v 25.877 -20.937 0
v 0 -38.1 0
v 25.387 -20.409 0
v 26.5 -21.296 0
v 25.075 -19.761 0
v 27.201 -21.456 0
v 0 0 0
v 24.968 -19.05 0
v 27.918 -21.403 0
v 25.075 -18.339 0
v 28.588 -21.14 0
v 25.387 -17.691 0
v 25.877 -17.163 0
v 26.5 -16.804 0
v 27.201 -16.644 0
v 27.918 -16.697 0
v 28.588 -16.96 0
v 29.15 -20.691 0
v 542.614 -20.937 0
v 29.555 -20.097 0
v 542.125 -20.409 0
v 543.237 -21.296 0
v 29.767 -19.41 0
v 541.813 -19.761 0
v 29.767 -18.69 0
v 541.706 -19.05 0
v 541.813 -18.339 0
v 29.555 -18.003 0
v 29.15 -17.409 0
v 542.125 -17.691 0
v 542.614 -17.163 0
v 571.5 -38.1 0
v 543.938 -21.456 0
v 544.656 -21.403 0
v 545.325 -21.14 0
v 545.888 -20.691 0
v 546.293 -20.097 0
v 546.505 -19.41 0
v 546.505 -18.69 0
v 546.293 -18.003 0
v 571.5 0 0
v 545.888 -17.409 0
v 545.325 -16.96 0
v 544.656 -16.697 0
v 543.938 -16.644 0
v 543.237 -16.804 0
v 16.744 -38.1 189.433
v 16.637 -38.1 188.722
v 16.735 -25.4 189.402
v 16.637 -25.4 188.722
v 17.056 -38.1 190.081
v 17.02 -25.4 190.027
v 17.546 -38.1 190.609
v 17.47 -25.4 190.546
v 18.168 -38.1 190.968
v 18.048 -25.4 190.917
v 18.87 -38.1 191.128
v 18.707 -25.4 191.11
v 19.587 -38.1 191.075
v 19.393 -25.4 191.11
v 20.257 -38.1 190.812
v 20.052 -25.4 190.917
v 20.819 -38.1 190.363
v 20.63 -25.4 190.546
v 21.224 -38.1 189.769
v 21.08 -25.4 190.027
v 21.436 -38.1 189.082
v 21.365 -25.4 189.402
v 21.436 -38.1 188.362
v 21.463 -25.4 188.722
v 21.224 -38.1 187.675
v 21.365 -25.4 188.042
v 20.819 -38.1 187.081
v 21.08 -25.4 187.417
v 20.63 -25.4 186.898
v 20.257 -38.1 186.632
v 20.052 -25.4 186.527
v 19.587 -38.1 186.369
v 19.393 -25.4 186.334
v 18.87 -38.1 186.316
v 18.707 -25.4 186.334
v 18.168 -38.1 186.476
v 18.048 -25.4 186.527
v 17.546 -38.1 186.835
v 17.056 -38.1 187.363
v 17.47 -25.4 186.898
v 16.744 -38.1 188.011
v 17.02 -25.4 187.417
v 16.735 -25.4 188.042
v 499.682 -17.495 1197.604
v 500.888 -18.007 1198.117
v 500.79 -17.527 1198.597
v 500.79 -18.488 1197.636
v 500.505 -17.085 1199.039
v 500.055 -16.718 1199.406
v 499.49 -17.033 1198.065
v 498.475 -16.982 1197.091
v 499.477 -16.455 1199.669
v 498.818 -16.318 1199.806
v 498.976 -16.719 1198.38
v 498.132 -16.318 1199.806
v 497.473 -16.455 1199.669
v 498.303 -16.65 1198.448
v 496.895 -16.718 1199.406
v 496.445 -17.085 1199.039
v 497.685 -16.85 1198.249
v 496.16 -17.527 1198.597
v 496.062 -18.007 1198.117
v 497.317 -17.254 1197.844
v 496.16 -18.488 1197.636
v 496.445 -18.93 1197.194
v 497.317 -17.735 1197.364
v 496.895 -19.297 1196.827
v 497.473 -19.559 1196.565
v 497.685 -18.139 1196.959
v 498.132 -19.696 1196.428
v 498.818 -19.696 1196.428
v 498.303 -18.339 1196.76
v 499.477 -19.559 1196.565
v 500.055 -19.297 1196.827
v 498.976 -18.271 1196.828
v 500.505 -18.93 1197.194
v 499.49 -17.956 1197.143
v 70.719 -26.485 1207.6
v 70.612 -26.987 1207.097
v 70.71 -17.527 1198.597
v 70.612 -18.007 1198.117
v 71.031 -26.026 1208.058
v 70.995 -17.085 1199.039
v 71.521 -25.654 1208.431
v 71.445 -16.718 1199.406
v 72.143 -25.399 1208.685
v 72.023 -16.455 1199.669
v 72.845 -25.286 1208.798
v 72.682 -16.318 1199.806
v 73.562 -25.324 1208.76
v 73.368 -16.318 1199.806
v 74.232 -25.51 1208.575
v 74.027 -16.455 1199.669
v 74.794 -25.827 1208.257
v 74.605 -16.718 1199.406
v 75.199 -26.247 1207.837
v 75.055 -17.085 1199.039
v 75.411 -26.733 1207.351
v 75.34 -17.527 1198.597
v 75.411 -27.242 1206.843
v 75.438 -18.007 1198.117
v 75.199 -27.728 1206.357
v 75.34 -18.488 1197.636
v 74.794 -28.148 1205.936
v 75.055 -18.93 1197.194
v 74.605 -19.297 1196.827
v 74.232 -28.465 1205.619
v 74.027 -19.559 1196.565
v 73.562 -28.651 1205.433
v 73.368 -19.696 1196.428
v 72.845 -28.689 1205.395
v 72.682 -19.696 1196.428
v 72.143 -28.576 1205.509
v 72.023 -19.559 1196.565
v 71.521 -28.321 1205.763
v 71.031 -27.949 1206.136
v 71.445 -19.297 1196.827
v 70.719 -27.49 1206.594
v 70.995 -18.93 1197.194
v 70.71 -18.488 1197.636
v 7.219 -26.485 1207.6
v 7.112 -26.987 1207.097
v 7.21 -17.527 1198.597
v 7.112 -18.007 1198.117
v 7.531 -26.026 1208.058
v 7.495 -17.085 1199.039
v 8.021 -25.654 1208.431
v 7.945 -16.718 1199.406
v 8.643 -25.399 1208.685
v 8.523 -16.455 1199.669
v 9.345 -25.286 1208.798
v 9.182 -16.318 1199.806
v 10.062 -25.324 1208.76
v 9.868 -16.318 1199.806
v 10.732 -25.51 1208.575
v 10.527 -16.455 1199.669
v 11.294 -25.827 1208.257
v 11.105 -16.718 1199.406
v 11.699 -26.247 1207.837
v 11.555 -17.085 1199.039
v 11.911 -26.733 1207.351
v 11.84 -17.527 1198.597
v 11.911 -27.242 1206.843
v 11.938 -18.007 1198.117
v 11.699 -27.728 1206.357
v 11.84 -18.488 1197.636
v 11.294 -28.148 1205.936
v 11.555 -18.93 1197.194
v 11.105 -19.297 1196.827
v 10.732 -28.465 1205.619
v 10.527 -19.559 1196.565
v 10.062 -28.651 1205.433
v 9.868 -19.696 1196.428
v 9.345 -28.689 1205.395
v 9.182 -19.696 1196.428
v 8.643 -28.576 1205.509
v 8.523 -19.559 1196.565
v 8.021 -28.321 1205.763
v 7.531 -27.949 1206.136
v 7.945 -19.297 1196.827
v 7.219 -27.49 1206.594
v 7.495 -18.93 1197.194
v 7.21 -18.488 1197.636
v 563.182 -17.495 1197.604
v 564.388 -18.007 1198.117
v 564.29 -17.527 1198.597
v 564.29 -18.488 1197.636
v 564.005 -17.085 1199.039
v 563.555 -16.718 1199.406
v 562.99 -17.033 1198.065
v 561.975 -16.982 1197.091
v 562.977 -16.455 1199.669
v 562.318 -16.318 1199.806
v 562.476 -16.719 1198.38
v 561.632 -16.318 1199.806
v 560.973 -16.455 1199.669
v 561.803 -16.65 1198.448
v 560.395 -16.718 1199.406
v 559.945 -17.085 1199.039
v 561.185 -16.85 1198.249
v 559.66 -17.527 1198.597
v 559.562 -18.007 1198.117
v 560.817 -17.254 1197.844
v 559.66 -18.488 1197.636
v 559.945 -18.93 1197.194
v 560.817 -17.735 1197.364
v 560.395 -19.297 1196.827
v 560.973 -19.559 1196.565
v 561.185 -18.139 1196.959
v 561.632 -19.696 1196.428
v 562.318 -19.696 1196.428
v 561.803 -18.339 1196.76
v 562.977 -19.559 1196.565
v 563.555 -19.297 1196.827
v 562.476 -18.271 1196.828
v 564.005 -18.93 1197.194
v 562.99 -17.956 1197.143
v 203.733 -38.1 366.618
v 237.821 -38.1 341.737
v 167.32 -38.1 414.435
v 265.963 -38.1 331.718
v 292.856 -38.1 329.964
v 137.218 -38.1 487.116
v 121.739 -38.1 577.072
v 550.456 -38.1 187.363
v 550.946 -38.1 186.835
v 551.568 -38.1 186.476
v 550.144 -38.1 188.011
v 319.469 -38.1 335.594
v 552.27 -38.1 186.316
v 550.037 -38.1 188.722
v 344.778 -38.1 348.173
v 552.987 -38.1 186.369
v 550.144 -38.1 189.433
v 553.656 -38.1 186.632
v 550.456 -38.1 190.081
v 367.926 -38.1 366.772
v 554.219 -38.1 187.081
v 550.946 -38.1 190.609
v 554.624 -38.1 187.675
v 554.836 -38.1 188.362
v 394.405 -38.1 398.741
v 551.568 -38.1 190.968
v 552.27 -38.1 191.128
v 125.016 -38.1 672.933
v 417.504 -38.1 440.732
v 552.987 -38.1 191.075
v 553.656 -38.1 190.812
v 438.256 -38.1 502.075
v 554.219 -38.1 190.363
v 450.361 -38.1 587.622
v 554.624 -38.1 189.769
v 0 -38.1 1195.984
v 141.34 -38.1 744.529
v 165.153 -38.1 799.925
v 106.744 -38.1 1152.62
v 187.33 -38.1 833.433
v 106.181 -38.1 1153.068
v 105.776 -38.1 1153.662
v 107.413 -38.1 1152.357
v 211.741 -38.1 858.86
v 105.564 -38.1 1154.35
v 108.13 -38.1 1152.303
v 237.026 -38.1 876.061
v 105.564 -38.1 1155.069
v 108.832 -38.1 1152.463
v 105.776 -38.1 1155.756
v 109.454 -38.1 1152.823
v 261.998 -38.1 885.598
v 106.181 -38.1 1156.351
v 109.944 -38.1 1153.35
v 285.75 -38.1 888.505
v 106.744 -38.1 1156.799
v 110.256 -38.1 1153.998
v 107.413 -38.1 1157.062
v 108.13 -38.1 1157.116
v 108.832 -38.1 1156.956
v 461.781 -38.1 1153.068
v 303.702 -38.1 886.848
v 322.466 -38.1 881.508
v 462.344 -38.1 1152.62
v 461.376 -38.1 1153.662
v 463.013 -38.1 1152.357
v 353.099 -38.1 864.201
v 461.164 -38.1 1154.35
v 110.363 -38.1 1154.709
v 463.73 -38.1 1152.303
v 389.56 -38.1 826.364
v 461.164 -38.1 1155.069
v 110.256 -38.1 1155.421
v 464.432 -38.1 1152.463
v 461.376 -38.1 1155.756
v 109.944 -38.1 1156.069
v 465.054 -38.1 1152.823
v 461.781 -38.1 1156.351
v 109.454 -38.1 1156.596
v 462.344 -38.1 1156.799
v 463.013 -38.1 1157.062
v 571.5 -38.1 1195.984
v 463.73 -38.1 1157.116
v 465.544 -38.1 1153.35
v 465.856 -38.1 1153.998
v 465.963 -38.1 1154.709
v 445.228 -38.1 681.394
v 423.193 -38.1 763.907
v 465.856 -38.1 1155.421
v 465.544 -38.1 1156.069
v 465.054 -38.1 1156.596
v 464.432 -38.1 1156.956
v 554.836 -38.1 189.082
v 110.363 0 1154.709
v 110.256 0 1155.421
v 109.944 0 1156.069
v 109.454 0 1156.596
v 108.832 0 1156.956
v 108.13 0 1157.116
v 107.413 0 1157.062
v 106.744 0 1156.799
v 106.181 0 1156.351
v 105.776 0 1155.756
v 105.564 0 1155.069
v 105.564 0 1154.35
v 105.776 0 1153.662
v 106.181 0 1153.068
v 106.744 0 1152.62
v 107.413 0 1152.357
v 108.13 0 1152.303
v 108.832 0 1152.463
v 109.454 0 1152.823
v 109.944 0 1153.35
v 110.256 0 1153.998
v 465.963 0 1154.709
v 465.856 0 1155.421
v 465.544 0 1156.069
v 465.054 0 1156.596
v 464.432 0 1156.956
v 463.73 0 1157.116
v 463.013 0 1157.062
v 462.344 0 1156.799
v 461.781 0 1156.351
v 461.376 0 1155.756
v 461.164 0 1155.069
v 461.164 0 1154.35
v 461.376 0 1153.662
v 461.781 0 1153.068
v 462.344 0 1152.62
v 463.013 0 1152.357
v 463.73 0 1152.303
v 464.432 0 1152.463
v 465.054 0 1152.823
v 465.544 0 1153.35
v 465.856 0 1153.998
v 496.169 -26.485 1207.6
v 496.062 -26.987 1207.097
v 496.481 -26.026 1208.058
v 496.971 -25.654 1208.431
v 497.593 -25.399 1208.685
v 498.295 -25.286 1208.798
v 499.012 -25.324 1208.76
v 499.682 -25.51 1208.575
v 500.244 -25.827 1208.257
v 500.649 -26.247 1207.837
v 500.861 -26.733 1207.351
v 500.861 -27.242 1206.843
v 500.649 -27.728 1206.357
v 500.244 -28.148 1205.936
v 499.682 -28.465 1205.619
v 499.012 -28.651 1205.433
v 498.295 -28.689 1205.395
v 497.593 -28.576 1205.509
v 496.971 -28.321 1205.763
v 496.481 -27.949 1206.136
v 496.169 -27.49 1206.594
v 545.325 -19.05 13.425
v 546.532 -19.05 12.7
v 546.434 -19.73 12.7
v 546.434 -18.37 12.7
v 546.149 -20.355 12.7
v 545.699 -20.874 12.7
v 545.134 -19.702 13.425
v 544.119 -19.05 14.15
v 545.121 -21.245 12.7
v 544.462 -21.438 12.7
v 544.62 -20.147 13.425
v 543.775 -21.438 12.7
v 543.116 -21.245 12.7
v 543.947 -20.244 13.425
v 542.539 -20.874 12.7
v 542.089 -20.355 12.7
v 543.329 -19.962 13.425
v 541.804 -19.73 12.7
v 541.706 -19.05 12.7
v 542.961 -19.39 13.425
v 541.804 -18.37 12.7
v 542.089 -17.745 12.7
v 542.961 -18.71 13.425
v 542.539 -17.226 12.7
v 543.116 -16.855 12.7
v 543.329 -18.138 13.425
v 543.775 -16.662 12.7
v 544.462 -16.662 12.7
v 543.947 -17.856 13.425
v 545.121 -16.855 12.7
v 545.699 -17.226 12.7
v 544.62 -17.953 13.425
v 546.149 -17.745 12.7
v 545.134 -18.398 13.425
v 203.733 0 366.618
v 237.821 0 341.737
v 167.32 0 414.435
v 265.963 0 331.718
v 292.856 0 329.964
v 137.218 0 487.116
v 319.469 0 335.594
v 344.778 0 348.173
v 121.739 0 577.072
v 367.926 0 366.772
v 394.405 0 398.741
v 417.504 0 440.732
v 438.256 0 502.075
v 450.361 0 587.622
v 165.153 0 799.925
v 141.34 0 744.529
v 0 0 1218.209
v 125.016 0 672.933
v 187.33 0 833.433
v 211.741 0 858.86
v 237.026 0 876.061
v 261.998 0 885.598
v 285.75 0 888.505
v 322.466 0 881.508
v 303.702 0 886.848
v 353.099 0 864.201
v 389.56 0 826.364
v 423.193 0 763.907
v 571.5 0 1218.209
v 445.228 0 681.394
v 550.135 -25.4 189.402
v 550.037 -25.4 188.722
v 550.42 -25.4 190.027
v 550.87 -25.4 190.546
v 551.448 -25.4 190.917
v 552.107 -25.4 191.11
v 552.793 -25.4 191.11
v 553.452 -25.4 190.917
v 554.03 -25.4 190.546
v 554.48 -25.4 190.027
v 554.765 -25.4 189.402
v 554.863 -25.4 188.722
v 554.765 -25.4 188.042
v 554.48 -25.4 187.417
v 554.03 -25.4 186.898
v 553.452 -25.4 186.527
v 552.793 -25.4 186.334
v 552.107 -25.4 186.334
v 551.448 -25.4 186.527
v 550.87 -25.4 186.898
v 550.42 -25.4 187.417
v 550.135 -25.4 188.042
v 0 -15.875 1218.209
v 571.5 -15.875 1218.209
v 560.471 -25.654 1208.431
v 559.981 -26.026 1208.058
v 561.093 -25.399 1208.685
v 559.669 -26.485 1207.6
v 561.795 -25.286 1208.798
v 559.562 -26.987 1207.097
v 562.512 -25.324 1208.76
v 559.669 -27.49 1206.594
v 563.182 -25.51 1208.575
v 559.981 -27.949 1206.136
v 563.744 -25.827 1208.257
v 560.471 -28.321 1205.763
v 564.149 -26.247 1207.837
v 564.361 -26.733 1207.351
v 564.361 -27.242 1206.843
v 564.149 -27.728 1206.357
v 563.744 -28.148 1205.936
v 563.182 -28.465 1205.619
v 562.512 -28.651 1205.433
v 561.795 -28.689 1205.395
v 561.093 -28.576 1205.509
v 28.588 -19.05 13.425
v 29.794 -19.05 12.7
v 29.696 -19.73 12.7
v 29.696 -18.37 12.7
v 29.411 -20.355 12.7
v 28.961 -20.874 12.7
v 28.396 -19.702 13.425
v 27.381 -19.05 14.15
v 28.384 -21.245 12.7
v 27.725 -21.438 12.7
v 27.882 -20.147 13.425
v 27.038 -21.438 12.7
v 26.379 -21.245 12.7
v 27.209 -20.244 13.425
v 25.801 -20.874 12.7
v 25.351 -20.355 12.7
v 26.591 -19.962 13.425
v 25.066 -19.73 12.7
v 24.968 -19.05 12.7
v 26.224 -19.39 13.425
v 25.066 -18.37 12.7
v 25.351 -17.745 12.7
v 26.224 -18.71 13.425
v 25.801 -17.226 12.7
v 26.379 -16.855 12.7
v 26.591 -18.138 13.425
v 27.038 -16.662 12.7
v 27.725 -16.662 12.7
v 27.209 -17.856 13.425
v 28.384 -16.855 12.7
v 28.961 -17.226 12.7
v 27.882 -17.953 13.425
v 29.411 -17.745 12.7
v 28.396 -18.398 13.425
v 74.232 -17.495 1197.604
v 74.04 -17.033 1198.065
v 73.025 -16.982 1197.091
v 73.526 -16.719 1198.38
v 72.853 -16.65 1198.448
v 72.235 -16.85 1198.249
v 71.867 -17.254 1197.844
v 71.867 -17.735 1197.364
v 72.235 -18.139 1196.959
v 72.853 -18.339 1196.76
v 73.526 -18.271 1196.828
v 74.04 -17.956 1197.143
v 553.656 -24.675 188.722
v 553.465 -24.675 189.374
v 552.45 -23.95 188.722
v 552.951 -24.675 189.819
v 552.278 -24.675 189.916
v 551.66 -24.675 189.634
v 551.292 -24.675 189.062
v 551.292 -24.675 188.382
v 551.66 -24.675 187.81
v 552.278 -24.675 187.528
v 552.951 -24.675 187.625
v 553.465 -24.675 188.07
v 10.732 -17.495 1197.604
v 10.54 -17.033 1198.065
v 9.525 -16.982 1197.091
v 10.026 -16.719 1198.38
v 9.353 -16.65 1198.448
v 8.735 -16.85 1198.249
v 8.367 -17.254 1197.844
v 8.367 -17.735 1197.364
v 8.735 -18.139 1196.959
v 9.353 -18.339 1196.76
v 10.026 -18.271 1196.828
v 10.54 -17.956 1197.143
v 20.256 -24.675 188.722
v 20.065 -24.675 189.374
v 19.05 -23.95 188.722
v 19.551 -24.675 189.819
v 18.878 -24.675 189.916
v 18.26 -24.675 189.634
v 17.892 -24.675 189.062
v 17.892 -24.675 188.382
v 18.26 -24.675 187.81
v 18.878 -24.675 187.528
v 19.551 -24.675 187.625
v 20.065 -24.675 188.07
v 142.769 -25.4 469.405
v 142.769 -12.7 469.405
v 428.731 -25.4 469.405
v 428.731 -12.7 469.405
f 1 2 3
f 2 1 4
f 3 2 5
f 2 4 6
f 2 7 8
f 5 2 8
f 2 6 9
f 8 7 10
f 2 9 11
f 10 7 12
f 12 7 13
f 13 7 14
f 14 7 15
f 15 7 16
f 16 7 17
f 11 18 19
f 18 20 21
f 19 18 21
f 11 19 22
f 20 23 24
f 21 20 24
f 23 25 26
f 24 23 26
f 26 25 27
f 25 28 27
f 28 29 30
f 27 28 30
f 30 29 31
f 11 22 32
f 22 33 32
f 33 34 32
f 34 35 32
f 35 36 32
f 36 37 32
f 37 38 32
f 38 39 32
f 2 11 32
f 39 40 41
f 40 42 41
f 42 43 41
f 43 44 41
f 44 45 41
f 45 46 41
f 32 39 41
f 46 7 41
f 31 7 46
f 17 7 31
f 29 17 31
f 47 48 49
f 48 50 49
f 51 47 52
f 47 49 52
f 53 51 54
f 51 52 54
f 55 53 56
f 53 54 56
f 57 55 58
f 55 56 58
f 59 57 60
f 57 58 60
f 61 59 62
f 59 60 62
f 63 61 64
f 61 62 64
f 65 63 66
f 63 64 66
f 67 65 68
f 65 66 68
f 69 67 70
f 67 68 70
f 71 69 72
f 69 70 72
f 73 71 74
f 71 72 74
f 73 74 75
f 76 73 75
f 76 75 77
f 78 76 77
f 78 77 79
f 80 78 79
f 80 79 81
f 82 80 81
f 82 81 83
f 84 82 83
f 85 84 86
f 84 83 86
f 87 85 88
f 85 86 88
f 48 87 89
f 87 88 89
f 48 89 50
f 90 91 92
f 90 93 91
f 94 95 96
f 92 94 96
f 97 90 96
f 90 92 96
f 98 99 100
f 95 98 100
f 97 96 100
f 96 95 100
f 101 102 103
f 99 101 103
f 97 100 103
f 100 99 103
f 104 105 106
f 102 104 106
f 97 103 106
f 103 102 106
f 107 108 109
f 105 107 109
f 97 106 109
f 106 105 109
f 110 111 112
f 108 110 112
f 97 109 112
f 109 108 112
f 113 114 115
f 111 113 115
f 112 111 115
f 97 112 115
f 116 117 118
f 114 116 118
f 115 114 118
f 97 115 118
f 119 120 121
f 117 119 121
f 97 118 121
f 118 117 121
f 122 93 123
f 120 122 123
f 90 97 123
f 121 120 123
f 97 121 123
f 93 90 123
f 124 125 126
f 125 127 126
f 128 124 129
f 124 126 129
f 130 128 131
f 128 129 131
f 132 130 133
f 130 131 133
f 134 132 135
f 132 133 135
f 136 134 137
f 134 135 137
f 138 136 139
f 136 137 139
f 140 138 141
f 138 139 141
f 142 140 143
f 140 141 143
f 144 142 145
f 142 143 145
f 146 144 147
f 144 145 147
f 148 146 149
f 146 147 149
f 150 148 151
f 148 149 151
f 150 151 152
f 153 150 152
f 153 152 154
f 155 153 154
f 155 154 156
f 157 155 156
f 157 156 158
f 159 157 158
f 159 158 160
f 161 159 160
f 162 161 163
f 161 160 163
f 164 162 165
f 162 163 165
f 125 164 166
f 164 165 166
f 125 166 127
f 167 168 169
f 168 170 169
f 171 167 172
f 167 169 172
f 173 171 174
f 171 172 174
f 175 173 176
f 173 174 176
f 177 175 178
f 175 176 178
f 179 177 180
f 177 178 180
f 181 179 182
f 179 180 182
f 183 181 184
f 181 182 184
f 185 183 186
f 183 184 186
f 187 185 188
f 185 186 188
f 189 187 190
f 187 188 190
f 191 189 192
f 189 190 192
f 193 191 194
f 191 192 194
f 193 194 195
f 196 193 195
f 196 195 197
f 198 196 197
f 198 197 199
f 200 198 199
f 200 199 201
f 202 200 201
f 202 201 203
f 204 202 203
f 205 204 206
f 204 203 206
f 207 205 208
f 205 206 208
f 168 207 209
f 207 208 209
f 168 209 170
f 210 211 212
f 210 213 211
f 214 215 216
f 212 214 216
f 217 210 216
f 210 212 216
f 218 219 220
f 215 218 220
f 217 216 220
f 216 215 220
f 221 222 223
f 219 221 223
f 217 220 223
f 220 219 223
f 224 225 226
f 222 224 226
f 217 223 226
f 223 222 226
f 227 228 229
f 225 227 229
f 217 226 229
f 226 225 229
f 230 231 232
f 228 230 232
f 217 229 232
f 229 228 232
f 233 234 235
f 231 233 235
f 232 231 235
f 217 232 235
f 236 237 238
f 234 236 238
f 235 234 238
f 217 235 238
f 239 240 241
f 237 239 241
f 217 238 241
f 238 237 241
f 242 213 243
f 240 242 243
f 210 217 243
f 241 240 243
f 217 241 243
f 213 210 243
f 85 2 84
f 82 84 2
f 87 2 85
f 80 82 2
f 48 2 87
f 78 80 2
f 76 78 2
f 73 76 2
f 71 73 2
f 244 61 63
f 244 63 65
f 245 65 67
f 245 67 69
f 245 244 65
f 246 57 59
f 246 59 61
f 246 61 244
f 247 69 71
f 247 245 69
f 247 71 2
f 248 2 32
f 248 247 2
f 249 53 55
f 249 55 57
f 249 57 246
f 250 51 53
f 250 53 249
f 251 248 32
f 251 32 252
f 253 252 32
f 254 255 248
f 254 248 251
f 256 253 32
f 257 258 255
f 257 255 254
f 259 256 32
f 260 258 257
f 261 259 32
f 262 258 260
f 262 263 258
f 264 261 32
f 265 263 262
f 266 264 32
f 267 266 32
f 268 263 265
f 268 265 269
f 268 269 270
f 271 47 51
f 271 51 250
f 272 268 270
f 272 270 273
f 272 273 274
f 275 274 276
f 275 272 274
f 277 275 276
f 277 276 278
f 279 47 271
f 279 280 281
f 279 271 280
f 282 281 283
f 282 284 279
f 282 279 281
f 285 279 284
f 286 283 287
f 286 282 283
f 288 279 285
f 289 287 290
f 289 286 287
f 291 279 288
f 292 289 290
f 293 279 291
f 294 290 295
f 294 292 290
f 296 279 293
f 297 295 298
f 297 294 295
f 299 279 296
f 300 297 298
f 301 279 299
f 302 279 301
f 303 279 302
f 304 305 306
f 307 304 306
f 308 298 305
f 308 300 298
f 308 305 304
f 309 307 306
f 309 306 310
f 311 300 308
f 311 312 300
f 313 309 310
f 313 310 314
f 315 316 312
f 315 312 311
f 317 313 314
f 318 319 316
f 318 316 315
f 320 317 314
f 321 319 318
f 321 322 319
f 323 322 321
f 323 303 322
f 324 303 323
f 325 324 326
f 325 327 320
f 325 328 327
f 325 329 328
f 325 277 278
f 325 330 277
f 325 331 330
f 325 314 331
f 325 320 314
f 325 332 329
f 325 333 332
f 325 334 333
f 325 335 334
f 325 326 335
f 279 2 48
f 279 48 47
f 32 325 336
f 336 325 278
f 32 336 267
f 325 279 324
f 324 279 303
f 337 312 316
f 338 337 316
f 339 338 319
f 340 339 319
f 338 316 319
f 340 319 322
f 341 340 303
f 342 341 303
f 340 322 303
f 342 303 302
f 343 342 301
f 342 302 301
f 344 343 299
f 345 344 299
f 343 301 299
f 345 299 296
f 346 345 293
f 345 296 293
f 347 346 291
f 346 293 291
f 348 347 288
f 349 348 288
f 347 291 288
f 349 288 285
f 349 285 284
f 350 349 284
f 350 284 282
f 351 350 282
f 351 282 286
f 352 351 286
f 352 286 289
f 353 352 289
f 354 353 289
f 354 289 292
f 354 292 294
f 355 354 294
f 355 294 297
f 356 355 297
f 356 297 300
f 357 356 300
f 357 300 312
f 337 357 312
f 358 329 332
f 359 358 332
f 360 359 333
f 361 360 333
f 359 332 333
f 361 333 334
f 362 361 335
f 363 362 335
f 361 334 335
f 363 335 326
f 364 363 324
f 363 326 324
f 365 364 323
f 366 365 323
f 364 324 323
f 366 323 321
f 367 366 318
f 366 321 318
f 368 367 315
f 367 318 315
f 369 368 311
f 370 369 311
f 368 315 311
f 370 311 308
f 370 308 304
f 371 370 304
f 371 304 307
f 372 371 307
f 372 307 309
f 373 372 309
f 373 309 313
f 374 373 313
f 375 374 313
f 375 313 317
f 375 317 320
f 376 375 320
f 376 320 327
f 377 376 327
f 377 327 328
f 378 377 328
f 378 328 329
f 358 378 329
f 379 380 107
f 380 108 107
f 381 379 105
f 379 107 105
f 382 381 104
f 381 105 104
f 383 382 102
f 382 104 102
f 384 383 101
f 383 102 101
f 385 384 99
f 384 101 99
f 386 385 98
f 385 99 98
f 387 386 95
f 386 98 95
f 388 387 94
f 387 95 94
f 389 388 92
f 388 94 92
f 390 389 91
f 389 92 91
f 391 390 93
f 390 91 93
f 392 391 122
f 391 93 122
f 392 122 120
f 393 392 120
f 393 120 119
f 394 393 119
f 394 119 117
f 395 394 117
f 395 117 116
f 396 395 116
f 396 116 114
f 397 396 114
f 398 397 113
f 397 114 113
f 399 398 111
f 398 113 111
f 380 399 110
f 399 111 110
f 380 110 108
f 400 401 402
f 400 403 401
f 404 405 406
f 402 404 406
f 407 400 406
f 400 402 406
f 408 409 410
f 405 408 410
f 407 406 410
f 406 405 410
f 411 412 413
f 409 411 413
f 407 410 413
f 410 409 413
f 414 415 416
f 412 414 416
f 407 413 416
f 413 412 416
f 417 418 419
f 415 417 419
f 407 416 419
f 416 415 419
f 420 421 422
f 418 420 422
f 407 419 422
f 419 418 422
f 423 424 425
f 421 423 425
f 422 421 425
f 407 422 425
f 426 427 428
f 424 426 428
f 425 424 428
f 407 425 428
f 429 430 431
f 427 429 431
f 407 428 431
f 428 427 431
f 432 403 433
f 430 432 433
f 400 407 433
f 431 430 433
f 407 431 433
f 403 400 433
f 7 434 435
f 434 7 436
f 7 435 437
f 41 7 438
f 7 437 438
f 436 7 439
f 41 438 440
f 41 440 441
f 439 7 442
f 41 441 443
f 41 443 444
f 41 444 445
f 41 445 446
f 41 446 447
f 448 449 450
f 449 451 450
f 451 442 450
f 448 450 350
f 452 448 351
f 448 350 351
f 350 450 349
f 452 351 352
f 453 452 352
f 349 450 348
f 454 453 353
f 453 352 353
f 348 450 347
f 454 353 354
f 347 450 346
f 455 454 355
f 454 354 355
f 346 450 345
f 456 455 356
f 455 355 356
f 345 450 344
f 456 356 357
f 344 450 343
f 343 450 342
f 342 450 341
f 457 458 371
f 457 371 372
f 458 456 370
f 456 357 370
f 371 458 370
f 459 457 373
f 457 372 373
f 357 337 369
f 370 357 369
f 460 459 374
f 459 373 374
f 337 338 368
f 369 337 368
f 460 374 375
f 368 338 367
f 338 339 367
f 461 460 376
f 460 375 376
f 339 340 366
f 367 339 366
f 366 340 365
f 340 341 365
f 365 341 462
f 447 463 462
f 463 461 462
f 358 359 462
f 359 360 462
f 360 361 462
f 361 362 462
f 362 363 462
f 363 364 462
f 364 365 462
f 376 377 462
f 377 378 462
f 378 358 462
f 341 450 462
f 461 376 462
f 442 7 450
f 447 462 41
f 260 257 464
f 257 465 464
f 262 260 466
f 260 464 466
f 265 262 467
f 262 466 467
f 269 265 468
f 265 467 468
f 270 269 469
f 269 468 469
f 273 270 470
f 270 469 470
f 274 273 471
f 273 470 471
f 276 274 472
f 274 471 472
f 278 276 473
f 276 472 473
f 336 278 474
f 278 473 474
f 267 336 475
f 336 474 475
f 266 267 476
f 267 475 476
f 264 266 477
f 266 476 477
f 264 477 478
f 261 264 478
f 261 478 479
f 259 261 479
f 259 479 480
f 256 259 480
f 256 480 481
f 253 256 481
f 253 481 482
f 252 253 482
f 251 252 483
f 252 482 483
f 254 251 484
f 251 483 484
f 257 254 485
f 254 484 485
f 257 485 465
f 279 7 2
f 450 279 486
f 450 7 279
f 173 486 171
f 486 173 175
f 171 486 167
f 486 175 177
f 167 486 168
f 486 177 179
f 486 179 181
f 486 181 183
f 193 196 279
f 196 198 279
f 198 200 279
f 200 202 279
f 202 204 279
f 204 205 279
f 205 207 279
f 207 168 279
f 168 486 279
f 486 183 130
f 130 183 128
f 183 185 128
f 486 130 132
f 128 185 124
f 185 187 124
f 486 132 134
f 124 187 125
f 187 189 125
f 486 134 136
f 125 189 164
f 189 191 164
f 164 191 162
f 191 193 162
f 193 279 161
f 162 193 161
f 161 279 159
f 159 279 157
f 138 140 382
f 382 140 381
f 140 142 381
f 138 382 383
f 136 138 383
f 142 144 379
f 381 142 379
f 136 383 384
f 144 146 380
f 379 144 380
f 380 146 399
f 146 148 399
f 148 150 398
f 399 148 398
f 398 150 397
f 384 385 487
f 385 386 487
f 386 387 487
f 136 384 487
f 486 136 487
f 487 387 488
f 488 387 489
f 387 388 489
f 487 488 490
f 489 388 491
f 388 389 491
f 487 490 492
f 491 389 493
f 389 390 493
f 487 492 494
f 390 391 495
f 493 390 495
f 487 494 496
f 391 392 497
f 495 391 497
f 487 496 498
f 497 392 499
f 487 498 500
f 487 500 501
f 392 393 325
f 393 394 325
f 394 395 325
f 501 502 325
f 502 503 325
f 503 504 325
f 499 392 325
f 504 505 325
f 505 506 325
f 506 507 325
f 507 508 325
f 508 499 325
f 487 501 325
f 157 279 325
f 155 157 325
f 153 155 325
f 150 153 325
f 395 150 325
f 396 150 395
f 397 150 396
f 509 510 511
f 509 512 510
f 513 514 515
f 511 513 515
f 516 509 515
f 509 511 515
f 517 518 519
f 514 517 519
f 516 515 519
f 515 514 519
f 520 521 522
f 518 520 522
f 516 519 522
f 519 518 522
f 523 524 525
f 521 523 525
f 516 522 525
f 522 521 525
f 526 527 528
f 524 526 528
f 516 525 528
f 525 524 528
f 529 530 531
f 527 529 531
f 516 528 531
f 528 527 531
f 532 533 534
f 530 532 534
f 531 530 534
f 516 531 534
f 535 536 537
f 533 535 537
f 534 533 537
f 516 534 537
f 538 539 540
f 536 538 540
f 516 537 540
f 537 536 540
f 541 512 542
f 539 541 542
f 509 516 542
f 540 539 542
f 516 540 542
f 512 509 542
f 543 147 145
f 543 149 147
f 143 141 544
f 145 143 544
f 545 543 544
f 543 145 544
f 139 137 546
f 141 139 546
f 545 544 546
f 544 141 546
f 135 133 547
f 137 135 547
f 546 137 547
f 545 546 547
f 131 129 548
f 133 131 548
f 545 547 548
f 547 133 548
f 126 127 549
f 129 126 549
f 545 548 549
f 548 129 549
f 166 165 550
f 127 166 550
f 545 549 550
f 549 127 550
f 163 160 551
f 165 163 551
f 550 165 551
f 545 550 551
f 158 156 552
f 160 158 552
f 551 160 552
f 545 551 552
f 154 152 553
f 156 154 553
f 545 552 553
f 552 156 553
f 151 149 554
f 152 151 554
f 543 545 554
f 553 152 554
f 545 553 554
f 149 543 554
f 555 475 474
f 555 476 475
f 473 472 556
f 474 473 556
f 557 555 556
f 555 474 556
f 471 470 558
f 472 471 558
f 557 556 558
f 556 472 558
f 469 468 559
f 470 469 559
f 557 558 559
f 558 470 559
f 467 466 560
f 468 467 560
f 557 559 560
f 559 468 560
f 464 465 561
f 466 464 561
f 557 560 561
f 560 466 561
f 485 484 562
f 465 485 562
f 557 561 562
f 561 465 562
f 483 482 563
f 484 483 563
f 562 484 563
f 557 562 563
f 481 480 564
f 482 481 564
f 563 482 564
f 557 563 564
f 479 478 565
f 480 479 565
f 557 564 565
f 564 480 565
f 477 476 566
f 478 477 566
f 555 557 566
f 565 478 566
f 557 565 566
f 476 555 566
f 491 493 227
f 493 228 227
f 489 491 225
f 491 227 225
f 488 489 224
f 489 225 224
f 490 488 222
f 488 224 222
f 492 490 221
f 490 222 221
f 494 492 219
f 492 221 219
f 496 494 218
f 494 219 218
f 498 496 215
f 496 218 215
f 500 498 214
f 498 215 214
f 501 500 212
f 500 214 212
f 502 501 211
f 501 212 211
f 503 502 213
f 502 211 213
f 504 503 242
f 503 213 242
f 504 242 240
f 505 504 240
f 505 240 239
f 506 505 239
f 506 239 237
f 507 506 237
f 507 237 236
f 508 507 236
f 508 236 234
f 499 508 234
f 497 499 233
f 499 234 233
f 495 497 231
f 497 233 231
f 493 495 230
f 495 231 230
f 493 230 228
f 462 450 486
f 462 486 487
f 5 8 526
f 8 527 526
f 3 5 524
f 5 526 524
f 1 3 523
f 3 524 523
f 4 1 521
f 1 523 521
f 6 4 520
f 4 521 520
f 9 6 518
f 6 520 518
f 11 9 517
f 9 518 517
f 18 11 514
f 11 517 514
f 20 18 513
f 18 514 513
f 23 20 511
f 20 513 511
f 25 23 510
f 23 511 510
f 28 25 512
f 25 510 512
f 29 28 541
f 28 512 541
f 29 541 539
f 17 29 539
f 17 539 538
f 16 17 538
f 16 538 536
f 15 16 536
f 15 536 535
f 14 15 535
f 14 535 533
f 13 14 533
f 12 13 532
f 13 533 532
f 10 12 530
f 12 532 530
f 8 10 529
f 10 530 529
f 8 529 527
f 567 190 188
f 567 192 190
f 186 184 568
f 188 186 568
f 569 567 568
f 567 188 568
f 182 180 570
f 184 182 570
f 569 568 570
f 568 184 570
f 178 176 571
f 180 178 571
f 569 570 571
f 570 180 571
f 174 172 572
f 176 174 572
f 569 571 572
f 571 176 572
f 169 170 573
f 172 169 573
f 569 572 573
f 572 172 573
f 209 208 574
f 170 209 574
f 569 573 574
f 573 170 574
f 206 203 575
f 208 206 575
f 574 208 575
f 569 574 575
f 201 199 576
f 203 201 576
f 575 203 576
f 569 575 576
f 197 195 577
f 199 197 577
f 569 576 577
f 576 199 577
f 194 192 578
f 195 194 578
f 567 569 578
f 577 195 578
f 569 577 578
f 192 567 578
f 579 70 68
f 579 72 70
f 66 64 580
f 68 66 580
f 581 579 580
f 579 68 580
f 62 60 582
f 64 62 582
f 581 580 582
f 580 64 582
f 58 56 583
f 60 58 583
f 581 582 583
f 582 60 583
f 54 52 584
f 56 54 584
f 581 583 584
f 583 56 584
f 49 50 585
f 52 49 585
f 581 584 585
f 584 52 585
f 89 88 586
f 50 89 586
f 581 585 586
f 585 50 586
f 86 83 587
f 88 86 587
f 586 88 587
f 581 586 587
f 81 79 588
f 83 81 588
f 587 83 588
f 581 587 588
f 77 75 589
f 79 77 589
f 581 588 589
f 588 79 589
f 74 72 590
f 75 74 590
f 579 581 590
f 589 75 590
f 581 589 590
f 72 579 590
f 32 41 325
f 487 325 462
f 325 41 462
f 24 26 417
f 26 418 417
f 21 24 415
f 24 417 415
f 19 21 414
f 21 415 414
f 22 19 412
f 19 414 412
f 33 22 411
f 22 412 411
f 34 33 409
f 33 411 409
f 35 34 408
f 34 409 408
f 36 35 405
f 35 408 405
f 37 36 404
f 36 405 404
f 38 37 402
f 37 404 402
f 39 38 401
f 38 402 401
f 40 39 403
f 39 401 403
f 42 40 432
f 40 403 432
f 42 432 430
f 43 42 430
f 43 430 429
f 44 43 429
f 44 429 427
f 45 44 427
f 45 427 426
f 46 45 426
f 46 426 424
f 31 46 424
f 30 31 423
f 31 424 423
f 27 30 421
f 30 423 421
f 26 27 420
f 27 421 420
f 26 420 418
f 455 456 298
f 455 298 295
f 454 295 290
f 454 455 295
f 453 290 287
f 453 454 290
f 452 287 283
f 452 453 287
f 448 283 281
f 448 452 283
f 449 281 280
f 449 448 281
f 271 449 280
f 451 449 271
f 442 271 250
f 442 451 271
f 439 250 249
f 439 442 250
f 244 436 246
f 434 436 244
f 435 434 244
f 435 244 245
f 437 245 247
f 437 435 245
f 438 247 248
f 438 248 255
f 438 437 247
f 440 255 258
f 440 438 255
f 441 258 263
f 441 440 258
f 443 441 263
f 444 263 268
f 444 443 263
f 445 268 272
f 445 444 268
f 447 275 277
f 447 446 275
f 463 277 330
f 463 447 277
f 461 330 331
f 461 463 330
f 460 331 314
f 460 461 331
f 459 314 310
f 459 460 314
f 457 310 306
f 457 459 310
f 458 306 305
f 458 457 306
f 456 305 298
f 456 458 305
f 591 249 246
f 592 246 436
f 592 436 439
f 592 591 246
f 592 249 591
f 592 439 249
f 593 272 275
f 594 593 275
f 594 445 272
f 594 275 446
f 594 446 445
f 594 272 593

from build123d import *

# Parameters (mm, degrees)
F0_W           = 571.5
F0_H           = 1218.2094
F1_DEPTH       = 38.1
F2_SIZE2       = 22.225
F2_SIZE        = 22.225
F4_D           = 4.826
F7_D           = 4.826
F7_DEPTH       = 12.7
F7_TIP         = 1.4498766737
F7_ON_F6_D     = 4.826
F7_ON_F6_DEPTH = 12.7
F7_ON_F6_TIP   = 1.4498766737
F9_D           = 4.826
F9_DEPTH       = 12.7
F9_TIP         = 1.4498766737


with BuildPart() as f1:
    # F0 (on Front) → F1 (new body)
    with BuildSketch(Plane.XZ):
        with Locations((285.75, 609.1047)):
            Rectangle(F0_W, F0_H)
        with BuildLine():
            add(Edge.make_bspline(
                [(285.75, 888.5047), (-0.2115883296, 888.5047), (142.7692058352, 469.4047), (285.75, 50.3047), (428.7307941648, 469.4047), (571.7115883296, 888.5047), (285.75, 888.5047)],
                knots=[0, 0, 0, 2.0943951024, 2.0943951024, 4.1887902048, 4.1887902048, 6.2831853072, 6.2831853072, 6.2831853072], degree=2, weights=[1, 0.5, 1, 0.5, 1, 0.5, 1]))
        make_face(mode=Mode.SUBTRACT)
    extrude(amount=F1_DEPTH)

    # F2
    f2_edges = [f1.edges().sort_by_distance(p)[0] for p in [
        (285.75, -38.1, 1218.2094),
    ]]
    chamfer(f2_edges, length=F2_SIZE, length2=F2_SIZE2)

    # F4 (through all)
    with Locations(Plane(origin=(0, 0, 0), x_dir=(-1, 0, 0), z_dir=(0, 1, 0))):
        with Locations((-463.55, 1154.7094), (-107.95, 1154.7094)):
            Hole(F4_D / 2)

    # F7
    with Locations(Plane(origin=(0, -617.0422, 617.0422), x_dir=(1, 0, 0), z_dir=(0, -0.7071067812, 0.7071067812))):
        with Locations((9.525, 834.463359282), (73.025, 834.463359282), (498.475, 834.463359282), (561.975, 834.463359282)):
            Hole(F7_D / 2, depth=F7_DEPTH)
            with Locations((0, 0, -(F7_DEPTH + F7_TIP / 2))):  # 118° drill point
                Cone(0, F7_D / 2, F7_TIP, mode=Mode.SUBTRACT)

    # F7 on F6
    with Locations(Plane.XZ.offset(38.1)):
        with Locations((19.05, 188.722), (552.45, 188.722)):
            Hole(F7_ON_F6_D / 2, depth=F7_ON_F6_DEPTH)
            with Locations((0, 0, -(F7_ON_F6_DEPTH + F7_ON_F6_TIP / 2))):  # 118° drill point
                Cone(0, F7_ON_F6_D / 2, F7_ON_F6_TIP, mode=Mode.SUBTRACT)

    # F9
    with Locations(Plane(origin=(0, 0, 0), x_dir=(1, 0, 0), z_dir=(0, 0, -1))):
        with Locations((27.3812, 19.05), (544.1188, 19.05)):
            Hole(F9_D / 2, depth=F9_DEPTH)
            with Locations((0, 0, -(F9_DEPTH + F9_TIP / 2))):  # 118° drill point
                Cone(0, F9_D / 2, F9_TIP, mode=Mode.SUBTRACT)


solid = f1.part
